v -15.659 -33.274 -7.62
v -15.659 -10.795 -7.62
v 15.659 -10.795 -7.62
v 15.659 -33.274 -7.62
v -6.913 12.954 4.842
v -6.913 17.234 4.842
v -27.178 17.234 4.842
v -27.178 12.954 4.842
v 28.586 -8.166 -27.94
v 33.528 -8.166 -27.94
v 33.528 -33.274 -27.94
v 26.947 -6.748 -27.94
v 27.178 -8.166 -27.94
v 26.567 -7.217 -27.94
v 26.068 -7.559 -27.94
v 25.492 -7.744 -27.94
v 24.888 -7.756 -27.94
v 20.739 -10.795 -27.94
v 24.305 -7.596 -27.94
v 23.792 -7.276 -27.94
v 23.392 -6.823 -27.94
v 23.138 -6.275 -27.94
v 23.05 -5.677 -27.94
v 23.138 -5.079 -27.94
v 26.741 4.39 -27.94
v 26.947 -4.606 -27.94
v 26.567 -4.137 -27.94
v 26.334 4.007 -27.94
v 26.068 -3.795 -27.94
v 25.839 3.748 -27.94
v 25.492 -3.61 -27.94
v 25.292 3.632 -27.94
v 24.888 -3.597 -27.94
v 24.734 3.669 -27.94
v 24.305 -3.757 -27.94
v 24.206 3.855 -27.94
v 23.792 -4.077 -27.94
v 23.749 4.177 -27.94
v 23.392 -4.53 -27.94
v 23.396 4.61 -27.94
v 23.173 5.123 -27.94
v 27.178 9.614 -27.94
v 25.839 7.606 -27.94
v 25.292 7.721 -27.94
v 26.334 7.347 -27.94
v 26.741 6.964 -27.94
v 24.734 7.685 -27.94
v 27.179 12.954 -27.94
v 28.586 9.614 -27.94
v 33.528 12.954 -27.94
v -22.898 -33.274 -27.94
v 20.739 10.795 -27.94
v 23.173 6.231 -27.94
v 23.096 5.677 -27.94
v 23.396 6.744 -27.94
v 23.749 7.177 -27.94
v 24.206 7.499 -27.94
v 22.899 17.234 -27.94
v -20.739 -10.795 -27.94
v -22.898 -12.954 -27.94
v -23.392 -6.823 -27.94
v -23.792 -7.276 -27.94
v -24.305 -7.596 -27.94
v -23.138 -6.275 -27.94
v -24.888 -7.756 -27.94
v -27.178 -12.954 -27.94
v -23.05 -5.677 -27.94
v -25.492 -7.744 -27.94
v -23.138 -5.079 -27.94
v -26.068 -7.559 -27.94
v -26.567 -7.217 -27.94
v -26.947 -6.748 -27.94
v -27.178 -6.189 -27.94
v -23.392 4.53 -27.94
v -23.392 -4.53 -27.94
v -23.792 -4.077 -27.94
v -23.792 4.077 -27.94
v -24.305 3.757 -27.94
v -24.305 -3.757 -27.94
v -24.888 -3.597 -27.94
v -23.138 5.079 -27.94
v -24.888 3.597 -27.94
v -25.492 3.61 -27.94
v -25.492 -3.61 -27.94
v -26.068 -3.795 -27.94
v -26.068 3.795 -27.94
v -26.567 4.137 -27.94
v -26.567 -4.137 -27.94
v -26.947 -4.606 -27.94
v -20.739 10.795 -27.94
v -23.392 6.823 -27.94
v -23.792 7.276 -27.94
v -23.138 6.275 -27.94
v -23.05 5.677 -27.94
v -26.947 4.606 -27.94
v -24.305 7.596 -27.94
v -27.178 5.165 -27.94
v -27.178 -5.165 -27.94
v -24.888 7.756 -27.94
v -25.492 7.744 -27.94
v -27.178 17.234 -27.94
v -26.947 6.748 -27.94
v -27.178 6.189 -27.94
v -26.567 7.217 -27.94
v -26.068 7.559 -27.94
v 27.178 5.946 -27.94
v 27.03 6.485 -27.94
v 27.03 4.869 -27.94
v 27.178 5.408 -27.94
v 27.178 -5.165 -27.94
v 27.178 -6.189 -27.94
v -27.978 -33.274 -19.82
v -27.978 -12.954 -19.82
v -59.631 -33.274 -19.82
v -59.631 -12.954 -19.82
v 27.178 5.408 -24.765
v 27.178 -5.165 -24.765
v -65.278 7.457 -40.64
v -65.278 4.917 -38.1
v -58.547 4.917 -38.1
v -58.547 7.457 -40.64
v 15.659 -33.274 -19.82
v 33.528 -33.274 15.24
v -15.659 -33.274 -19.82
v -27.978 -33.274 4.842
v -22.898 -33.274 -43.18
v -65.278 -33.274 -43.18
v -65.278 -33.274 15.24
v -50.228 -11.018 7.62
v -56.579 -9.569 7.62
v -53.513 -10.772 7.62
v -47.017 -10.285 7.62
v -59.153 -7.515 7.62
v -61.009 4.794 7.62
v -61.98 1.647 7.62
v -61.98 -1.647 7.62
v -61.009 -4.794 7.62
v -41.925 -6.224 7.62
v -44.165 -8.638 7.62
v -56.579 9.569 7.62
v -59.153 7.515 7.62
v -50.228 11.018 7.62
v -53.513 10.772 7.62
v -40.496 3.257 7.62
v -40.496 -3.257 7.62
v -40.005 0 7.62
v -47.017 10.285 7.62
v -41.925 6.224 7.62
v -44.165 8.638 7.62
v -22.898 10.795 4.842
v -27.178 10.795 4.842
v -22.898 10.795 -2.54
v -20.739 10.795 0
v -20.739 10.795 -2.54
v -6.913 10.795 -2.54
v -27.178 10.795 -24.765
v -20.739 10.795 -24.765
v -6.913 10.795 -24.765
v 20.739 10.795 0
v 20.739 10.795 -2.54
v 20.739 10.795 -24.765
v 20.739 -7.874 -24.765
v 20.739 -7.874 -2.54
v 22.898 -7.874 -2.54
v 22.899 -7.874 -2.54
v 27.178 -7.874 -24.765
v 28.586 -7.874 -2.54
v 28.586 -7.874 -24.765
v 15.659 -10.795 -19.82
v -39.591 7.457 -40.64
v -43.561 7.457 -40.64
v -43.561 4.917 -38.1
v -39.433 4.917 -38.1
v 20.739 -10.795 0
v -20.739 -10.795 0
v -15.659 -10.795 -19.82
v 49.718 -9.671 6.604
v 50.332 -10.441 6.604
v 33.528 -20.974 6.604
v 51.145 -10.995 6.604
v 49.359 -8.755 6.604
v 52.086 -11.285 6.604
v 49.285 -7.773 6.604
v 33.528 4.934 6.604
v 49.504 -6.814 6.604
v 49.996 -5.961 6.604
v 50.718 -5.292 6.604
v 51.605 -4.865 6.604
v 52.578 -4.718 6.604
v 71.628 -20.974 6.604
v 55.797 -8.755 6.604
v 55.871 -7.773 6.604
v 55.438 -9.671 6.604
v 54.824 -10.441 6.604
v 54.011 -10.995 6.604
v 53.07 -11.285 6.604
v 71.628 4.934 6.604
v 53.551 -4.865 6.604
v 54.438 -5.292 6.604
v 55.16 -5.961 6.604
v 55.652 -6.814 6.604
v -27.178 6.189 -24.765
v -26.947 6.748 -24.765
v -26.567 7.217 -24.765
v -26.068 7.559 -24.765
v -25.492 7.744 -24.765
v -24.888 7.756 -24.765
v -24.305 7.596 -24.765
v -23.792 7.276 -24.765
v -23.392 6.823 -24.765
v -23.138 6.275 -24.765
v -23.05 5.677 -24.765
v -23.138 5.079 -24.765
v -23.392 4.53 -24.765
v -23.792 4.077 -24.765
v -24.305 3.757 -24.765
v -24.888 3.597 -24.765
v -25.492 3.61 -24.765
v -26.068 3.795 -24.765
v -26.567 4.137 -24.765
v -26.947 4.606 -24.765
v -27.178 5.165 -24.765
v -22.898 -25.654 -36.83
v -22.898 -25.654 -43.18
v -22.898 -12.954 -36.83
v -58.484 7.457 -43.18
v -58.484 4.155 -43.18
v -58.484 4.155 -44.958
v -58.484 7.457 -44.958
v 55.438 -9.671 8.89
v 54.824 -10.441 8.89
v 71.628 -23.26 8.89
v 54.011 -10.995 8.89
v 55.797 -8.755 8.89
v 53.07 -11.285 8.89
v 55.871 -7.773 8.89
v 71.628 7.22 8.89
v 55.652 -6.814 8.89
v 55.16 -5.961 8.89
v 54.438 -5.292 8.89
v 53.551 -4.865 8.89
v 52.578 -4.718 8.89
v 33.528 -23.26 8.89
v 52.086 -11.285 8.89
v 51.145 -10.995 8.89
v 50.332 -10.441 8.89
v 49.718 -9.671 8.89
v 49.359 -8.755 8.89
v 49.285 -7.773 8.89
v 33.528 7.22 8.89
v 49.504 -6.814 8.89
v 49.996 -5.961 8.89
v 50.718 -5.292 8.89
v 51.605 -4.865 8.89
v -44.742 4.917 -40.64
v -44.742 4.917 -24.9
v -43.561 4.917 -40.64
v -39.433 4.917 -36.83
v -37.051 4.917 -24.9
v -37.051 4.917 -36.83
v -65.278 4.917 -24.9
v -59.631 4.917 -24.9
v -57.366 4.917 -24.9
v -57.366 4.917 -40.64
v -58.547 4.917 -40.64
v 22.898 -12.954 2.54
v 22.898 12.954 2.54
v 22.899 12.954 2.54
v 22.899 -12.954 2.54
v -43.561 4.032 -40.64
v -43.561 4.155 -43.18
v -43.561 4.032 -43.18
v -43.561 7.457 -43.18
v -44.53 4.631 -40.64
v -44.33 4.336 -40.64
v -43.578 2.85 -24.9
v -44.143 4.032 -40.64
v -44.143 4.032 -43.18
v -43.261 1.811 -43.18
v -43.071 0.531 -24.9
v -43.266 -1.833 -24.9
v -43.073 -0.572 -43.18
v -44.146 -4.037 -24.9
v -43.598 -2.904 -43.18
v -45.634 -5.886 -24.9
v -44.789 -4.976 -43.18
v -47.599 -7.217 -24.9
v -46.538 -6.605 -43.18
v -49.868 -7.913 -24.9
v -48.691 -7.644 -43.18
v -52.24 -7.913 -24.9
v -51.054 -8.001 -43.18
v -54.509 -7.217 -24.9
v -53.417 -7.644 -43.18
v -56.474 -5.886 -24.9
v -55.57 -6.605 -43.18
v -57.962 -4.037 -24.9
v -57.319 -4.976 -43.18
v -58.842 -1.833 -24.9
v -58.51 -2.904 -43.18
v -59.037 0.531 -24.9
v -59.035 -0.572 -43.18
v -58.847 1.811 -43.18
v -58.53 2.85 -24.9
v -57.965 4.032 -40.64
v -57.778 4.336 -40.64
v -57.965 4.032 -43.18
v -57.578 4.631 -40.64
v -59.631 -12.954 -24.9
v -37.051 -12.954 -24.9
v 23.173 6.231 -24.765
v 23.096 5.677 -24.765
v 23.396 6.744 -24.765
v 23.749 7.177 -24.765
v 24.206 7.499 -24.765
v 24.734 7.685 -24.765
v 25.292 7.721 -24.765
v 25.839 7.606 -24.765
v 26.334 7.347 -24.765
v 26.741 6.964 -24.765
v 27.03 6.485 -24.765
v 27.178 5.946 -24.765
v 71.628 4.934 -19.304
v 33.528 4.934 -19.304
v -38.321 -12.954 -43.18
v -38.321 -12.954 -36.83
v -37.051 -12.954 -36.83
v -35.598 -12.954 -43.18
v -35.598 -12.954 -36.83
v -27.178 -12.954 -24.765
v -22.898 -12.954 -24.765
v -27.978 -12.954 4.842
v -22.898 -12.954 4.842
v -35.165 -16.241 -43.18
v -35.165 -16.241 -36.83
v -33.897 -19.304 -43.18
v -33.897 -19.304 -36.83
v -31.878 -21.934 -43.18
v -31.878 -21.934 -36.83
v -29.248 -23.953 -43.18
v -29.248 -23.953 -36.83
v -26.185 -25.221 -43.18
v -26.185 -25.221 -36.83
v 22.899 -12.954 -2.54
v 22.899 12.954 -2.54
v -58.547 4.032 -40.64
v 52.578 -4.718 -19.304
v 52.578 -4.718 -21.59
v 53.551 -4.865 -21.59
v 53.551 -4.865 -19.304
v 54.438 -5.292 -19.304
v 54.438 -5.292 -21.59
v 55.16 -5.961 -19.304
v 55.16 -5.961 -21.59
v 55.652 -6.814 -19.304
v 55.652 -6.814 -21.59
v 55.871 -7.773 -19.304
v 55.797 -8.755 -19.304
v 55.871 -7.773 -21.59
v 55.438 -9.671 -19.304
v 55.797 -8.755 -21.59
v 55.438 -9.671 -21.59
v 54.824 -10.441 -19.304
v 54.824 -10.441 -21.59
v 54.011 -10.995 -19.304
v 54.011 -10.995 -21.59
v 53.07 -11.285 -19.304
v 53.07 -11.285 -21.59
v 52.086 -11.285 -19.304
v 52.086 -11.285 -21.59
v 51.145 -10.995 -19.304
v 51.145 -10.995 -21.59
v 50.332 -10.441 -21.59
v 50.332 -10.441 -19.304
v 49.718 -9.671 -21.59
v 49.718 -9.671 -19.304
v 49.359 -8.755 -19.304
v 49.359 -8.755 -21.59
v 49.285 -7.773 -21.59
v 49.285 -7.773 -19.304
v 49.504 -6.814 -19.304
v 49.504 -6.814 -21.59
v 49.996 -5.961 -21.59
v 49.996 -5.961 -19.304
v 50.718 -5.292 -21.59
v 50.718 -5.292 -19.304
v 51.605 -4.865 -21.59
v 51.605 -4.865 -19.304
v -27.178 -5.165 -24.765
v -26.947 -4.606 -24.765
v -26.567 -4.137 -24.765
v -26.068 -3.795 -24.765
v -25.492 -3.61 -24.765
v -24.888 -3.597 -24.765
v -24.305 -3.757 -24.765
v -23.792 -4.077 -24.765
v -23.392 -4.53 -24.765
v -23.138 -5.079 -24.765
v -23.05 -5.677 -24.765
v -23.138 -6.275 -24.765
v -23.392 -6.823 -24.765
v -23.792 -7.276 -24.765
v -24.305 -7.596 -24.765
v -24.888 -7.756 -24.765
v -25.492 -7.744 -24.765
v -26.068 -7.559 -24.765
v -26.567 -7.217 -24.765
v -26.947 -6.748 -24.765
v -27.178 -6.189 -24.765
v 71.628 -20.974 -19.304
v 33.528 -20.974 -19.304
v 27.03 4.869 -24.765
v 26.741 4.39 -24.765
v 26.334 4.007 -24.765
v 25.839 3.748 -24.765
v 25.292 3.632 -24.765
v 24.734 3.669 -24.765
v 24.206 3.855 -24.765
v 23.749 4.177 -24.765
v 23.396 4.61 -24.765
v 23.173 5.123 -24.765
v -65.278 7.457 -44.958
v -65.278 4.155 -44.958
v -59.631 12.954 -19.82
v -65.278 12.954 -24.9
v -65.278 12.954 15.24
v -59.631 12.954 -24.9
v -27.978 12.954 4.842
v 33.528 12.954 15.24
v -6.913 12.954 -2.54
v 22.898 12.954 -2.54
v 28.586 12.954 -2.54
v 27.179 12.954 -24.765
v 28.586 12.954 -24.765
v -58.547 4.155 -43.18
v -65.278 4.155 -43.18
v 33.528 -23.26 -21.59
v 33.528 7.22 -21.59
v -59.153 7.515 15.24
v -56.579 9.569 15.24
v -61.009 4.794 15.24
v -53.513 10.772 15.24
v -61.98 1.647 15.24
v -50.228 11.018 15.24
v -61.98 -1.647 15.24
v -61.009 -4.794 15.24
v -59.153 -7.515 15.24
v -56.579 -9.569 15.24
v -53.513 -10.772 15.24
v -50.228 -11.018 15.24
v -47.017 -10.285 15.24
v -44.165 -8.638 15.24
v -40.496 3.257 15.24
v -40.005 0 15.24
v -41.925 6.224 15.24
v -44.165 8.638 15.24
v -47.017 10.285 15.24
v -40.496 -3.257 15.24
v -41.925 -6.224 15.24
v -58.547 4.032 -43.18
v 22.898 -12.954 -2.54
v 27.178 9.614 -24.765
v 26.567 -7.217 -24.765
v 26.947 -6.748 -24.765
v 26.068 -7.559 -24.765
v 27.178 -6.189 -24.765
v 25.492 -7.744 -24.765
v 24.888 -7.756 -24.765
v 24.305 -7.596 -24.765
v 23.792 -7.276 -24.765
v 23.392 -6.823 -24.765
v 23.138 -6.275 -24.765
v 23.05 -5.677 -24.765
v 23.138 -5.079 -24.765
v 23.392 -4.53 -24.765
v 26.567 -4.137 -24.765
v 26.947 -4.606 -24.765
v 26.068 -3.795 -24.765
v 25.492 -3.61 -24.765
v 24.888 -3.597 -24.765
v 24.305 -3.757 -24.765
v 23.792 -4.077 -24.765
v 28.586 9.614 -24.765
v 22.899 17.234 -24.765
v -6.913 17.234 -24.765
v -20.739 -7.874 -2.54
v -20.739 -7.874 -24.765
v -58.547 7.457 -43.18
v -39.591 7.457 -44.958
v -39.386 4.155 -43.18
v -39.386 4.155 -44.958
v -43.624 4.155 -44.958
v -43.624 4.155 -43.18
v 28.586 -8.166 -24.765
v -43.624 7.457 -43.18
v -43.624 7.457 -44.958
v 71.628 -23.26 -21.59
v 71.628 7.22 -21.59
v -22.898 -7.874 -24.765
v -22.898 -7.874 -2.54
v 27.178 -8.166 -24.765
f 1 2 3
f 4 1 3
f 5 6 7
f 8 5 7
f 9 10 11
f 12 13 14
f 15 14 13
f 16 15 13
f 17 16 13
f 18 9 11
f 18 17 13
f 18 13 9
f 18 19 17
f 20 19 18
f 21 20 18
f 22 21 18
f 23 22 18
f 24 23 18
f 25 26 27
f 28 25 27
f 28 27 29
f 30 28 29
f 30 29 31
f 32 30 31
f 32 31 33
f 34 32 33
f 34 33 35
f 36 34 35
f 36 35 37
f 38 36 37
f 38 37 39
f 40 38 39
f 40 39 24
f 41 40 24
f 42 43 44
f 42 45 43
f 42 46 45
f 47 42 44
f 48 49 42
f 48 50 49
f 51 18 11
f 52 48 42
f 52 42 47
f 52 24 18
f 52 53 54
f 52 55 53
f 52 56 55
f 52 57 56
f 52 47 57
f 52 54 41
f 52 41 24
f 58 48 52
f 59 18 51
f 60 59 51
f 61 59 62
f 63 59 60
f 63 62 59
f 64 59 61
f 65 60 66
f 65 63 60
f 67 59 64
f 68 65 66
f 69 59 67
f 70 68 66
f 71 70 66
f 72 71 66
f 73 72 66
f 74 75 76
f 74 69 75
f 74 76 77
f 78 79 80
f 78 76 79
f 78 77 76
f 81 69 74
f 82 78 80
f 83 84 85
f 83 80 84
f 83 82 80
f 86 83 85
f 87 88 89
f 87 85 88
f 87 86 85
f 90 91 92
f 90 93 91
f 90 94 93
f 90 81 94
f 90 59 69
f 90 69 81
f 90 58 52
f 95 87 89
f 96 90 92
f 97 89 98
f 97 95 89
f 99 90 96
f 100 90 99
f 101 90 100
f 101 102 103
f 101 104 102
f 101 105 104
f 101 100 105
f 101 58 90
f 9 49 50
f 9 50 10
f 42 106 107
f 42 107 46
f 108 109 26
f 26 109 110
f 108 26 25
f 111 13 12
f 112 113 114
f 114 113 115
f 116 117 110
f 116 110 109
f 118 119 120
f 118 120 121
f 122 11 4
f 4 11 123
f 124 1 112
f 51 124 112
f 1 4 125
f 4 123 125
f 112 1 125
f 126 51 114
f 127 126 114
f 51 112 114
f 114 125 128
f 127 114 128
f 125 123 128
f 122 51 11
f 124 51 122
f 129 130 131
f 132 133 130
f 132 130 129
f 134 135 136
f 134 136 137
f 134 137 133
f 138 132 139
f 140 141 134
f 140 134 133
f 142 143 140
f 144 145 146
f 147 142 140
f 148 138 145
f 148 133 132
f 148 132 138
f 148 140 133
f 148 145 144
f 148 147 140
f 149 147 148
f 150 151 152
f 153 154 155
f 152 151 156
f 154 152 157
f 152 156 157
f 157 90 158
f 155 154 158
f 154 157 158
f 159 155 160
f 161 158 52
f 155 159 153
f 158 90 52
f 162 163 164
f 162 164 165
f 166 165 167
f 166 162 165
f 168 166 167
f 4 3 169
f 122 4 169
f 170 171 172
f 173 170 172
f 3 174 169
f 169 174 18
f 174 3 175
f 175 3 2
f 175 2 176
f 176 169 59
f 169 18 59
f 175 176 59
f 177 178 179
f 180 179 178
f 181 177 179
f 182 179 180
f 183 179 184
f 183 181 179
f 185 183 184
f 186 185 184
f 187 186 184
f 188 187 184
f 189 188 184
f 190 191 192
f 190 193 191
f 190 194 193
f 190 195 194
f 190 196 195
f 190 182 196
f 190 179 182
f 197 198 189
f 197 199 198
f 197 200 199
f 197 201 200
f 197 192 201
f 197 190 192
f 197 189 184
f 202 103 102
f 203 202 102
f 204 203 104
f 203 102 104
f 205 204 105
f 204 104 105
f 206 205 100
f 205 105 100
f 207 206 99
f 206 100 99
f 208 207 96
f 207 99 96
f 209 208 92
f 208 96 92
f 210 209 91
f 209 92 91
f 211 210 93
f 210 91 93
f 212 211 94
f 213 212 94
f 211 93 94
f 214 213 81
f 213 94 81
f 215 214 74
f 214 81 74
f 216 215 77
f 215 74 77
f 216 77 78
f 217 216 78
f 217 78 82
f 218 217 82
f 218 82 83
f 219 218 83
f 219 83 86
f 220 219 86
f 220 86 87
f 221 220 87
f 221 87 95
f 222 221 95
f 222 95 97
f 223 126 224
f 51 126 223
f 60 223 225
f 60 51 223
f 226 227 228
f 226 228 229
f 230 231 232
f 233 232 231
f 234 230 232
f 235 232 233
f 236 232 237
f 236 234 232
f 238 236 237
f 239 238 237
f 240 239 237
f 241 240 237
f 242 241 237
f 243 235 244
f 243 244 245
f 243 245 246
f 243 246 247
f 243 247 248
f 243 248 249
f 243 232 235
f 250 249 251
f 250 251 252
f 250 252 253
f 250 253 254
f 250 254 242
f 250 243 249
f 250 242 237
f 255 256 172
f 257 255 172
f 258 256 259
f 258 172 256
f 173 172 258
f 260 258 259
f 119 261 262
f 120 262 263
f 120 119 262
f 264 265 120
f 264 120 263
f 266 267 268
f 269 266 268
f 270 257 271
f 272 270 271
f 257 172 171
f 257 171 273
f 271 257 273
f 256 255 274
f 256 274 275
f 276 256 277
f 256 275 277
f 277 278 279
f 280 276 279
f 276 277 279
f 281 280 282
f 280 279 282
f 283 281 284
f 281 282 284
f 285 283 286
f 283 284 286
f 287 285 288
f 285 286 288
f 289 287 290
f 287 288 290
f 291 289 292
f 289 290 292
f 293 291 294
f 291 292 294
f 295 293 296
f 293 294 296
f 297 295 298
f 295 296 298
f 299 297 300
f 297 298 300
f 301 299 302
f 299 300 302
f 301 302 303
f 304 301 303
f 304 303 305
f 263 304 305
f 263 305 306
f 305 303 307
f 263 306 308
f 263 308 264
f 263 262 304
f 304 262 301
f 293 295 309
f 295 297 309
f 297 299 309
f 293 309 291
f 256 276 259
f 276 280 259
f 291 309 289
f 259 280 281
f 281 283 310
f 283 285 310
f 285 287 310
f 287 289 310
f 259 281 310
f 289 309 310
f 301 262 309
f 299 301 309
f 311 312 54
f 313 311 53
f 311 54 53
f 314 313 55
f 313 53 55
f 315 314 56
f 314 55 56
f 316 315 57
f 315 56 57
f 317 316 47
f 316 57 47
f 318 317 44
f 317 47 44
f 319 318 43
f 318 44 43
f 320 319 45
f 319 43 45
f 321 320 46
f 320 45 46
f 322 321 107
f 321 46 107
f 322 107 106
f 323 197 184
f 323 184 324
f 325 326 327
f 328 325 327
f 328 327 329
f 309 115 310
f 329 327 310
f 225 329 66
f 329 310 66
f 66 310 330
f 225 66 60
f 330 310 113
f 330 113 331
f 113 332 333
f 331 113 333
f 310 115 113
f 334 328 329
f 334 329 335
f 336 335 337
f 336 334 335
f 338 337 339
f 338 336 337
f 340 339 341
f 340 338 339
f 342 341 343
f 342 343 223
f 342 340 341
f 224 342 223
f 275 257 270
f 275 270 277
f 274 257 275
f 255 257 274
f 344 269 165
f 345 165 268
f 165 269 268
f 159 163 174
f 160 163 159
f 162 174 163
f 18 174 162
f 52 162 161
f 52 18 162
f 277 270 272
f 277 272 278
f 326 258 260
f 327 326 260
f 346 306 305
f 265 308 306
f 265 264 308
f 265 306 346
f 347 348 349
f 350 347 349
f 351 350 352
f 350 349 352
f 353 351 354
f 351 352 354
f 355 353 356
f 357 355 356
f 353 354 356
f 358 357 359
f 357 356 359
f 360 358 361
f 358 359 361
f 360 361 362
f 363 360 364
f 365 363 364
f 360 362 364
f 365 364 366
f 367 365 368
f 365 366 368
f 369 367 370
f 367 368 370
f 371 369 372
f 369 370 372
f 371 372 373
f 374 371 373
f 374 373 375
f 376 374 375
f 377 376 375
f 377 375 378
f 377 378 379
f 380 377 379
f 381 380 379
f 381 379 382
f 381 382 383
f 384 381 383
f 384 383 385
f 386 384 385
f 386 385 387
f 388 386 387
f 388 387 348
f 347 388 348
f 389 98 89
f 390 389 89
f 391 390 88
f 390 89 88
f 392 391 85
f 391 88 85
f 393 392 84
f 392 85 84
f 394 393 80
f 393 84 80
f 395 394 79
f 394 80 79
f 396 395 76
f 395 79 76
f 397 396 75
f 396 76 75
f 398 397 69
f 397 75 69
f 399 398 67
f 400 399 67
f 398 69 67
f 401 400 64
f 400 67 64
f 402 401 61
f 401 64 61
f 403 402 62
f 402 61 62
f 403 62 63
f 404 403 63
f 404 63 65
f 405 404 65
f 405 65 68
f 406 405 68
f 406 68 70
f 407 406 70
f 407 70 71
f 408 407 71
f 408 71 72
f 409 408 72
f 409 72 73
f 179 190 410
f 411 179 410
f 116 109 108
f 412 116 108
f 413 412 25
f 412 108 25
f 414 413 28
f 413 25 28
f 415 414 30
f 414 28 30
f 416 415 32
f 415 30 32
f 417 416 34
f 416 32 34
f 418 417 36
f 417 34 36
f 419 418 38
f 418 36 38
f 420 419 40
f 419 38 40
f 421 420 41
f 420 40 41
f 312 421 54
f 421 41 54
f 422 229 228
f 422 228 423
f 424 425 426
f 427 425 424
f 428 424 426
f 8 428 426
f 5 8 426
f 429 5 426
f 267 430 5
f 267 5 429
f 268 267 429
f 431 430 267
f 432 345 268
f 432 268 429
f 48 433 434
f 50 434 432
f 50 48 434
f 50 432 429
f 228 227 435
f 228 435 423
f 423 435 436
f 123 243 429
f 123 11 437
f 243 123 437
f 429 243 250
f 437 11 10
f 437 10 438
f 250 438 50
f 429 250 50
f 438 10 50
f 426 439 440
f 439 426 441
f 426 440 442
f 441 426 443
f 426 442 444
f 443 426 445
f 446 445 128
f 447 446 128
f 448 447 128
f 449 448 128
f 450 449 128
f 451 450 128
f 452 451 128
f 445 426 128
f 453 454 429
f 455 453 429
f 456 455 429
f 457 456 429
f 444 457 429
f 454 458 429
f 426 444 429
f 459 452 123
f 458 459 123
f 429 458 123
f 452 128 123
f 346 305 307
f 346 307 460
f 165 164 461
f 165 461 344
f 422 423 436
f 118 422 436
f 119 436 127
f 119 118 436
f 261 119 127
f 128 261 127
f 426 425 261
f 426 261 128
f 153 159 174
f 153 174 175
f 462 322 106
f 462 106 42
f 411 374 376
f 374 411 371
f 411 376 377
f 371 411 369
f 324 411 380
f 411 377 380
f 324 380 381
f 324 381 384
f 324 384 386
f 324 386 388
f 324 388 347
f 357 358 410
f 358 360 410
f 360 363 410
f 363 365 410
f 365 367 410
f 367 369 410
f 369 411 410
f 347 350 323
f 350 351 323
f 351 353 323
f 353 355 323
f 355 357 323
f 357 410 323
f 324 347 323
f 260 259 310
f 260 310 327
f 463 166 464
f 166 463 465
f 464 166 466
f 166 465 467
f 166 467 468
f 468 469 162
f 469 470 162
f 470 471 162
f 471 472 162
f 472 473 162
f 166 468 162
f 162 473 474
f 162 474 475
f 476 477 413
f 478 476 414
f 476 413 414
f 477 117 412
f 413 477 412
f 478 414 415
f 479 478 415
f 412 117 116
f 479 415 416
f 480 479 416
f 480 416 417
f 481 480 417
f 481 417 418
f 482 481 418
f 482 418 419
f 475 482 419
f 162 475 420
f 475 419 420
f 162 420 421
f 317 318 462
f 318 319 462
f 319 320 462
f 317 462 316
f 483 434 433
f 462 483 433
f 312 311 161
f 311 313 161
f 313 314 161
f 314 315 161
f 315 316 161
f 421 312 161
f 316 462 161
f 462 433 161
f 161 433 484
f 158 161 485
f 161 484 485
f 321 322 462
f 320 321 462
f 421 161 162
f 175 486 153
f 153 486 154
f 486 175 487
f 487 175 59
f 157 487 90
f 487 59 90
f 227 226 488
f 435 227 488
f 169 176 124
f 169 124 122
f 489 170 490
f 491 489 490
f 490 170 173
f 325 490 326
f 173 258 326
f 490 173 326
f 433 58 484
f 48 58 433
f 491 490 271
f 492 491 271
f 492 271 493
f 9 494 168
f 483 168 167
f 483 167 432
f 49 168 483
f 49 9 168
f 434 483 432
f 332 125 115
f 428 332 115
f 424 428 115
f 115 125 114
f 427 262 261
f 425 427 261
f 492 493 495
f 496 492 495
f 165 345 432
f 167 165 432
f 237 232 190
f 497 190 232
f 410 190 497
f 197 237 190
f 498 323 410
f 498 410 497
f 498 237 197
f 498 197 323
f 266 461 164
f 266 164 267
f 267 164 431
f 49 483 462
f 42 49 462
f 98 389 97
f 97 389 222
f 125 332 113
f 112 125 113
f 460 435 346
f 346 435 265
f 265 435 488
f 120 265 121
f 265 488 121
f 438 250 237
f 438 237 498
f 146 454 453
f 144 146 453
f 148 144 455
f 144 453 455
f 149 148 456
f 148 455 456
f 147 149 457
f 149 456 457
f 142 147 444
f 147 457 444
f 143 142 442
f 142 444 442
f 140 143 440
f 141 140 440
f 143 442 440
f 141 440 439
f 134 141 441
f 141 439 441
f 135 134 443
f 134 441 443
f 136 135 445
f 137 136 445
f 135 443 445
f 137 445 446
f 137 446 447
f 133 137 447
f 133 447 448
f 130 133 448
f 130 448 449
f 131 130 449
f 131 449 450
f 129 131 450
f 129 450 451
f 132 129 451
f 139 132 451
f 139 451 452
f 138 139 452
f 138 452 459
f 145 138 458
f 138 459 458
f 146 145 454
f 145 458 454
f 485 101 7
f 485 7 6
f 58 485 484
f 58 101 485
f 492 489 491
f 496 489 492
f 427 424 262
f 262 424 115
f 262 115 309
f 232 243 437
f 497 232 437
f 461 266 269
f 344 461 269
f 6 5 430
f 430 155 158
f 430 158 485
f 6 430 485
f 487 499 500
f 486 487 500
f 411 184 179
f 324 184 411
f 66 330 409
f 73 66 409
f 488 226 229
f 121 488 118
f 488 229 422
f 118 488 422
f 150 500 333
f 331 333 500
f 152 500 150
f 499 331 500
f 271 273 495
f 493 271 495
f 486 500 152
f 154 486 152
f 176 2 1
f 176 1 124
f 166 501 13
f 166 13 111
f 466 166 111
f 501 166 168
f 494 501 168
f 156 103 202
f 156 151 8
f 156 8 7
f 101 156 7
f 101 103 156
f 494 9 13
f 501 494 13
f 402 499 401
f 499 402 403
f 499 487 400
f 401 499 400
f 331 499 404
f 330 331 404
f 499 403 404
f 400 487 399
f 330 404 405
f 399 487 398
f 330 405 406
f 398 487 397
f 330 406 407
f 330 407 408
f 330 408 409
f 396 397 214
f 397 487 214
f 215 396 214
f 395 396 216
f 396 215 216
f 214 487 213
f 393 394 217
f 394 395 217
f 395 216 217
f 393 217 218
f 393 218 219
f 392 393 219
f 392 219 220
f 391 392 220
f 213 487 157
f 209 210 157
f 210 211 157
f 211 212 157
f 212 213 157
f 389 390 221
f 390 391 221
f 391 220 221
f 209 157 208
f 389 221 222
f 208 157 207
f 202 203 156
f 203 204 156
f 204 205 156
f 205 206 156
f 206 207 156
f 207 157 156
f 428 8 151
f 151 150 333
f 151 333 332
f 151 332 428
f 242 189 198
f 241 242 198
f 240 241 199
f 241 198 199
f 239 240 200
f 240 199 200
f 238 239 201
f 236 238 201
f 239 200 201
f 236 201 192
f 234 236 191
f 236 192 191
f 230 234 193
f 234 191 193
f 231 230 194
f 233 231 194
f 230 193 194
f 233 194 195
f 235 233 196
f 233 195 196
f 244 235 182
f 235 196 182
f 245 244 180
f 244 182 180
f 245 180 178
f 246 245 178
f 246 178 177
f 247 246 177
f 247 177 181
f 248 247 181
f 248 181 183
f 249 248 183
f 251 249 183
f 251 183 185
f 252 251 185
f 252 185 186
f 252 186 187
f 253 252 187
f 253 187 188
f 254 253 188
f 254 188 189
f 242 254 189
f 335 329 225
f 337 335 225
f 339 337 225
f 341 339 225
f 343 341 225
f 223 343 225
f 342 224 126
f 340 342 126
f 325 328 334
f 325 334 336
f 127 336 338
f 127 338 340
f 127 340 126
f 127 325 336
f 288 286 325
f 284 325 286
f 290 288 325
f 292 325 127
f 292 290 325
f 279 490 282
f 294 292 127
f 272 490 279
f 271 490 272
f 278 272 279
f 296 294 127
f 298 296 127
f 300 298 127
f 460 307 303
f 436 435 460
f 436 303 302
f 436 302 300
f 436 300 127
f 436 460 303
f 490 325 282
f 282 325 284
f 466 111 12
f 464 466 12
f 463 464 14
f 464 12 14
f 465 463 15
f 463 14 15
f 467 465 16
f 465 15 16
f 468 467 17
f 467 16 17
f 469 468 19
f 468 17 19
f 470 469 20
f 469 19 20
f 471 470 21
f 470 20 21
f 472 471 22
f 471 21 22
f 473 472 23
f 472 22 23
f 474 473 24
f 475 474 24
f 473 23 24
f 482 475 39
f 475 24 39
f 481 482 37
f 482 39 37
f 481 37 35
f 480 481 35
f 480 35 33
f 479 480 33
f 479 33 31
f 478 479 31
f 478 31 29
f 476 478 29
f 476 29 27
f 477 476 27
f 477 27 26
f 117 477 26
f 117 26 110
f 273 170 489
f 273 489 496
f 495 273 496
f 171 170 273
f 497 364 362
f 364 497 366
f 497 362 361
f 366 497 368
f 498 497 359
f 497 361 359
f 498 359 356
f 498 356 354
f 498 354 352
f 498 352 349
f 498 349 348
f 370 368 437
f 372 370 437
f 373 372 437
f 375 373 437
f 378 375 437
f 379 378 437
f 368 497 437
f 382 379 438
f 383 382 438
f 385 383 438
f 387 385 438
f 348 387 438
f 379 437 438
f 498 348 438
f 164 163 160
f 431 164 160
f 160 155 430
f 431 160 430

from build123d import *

# Parameters (mm, degrees)
SKETCH1_W                = 54.356
SKETCH1_H                = 34.4678
SKETCH1_W_2              = 40.2082
SKETCH1_H_2              = 20.32
BOSS_EXTRUDE1_DEPTH      = 27.94
SKETCH2_W                = 54.356
SKETCH2_H                = 34.4678
SKETCH2_W_2              = 45.7962
SKETCH2_H_2              = 25.908
CUT_EXTRUDE1_DEPTH       = 24.765
SKETCH3_R                = 2.04968225
SKETCH3_R_2              = 2.0955
CUT_EXTRUDE2_DEPTH       = 43.618007851
SKETCH4_W                = 19.05
SKETCH4_H                = 9.525
CUT_EXTRUDE3_DEPTH       = 12.7
SKETCH5_W                = 45.7962
SKETCH5_H                = 25.908
BOSS_EXTRUDE2_DEPTH      = 2.54
SKETCH6_W                = 25.4
SKETCH6_H                = 4.2799
BOSS_EXTRUDE3_DEPTH      = 27.305
SKETCH7_W                = 25.4
SKETCH7_H                = 6.35
BOSS_EXTRUDE4_DEPTH      = 19.05
SKETCH10_W               = 3.175
SKETCH10_H               = 19.05
BOSS_EXTRUDE5_DEPTH      = 19.05
CHAMFER1_SIZE            = 19.05
SKETCH12_W               = 7.62
SKETCH12_H               = 31.75
BOSS_EXTRUDE6_DEPTH      = 3.175
SKETCH13_W               = 41.4782
SKETCH13_H               = 21.59
CUT_EXTRUDE7_DEPTH       = 27.94
SKETCH14_W               = 22.225
SKETCH14_H               = 20.828
SKETCH14_W_2             = 49.53
SKETCH14_H_2             = 7.4549
CUT_EXTRUDE8_DEPTH       = 61.866925258
SKETCH15_W               = 3.175
SKETCH15_H               = 4.2799
CUT_EXTRUDE9_DEPTH       = 64.49980823
SKETCH16_W               = 45.796723327
SKETCH16_H               = 30.48
BOSS_EXTRUDE7_DEPTH      = 20.32
BOSS_EXTRUDE8_DEPTH      = 15.24
BOSS_EXTRUDE8_DEPTH_BACK = 10.16
SKETCH17_W               = 42.3799
SKETCH17_H               = 20.32
SKETCH18_W               = 28.227007584
SKETCH18_H               = 18.279535796
BOSS_EXTRUDE9_DEPTH      = 17.871186
SKETCH19_R               = 8.001
CUT_EXTRUDE10_DEPTH      = 18.279536
SKETCH20_W               = 19.05
SKETCH20_H               = 21.1201
CUT_EXTRUDE11_DEPTH      = 75.022207933
SKETCH21_W               = 45.796723327
SKETCH21_H               = 46.228
BOSS_EXTRUDE10_DEPTH     = 12.7
SKETCH25_W               = 6.35
SKETCH25_H               = 7.62
SKETCH25_W_2             = 10.629376673
SKETCH25_H_2             = 25.1079
BOSS_EXTRUDE12_DEPTH     = 3.175
SKETCH26_W               = 10.629376673
SKETCH26_H               = 50.5079
BOSS_EXTRUDE14_DEPTH     = 17.78
BOSS_EXTRUDE15_START     = -3.175
SKETCH27_W               = 4.942428742
SKETCH27_H               = 50.5079
BOSS_EXTRUDE15_DEPTH     = 25.4
SKETCH28_W               = 7.846471258
SKETCH28_H               = 22.225
BOSS_EXTRUDE16_DEPTH     = 25.4
SKETCH29_W               = 30.48
SKETCH29_H               = 30.48
BOSS_EXTRUDE17_DEPTH     = 38.1
SKETCH30_W               = 25.908
SKETCH30_H               = 25.908
CUT_EXTRUDE13_DEPTH      = 38.1
SKETCH31_R               = 3.302
CUT_EXTRUDE14_DEPTH      = 88.144583079
BOSS_EXTRUDE18_DEPTH     = 20.32
SKETCH34_W               = 31.3182
SKETCH34_H               = 12.200464204
CUT_EXTRUDE15_DEPTH      = 89.208287701
BOSS_EXTRUDE22_REACH     = 99.704
SKETCH37_R               = 11.049
CUT_EXTRUDE16_DEPTH      = 7.62
BOSS_EXTRUDE25_REACH     = 90.533
SKETCH38_W               = 20.264989175
SKETCH38_H               = 6.4389
SKETCH39_W               = 10.629376673
SKETCH39_H               = 43.18
CUT_EXTRUDE17_DEPTH      = 4.2799
BOSS_EXTRUDE26_DEPTH     = 3.175
SKETCH42_W               = 28.227007584
SKETCH42_H               = 2.54
BOSS_EXTRUDE27_DEPTH     = 2.54
CUT_EXTRUDE18_DEPTH      = 7.62
CUT_EXTRUDE18_DEPTH_BACK = 2.54
SKETCH41_W               = 14.986
SKETCH41_H               = 7.62
SKETCH43_W               = 6.573507584
SKETCH43_H               = 3.302
SKETCH43_W_2             = 6.7945
BOSS_EXTRUDE28_DEPTH     = 1.778
BOSS_EXTRUDE29_DEPTH     = 6.731
BOSS_EXTRUDE30_DEPTH     = 6.510007584
CUT_EXTRUDE19_DEPTH      = 6.35
CUT_EXTRUDE20_DEPTH      = 6.35
CUT_EXTRUDE20_DEPTH_BACK = 6.35


with BuildPart() as part:
    # Sketch1 → Boss-Extrude1 (new body)
    with BuildSketch(Plane.XY):
        Rectangle(SKETCH1_W, SKETCH1_H)
        Rectangle(SKETCH1_W_2, SKETCH1_H_2, mode=Mode.SUBTRACT)
    extrude(amount=-BOSS_EXTRUDE1_DEPTH)

    # Sketch2 → Cut-Extrude1 (cut)
    with BuildSketch(Plane.XY):
        Rectangle(SKETCH2_W, SKETCH2_H)
        Rectangle(SKETCH2_W_2, SKETCH2_H_2, mode=Mode.SUBTRACT)
    extrude(amount=-CUT_EXTRUDE1_DEPTH, mode=Mode.SUBTRACT)

    # Sketch3 → Cut-Extrude2 (cut, through all)
    with BuildSketch(Plane(origin=(0, 0, -27.94), x_dir=(-1, 0, 0), z_dir=(0, 0, -1))):
        with Locations((-25.146, 5.6769)):
            Circle(SKETCH3_R)
        with Locations((-25.146, -5.6769)):
            Circle(SKETCH3_R_2)
        with Locations((25.146, -5.6769)):
            Circle(SKETCH3_R_2)
        with Locations((25.146, 5.6769)):
            Circle(SKETCH3_R_2)
    extrude(amount=-CUT_EXTRUDE2_DEPTH, mode=Mode.SUBTRACT)

    # Sketch4 → Cut-Extrude3 (cut)
    with BuildSketch(Plane(origin=(22.8981, 0, 0), x_dir=(0, 0, -1), z_dir=(1, 0, 0))):
        with Locations((12.065, 0)):
            Rectangle(SKETCH4_W, SKETCH4_H)
    extrude(amount=-CUT_EXTRUDE3_DEPTH, mode=Mode.SUBTRACT)

    # Sketch5 → Boss-Extrude2 (add)
    with BuildSketch(Plane.XY):
        Rectangle(SKETCH5_W, SKETCH5_H)
    extrude(amount=BOSS_EXTRUDE2_DEPTH)

    # Sketch6 → Boss-Extrude3 (add)
    with BuildSketch(Plane.XY.offset(2.54)):
        with Locations((0, -15.09395)):
            Rectangle(SKETCH6_W, SKETCH6_H)
    extrude(amount=-BOSS_EXTRUDE3_DEPTH)

    # Sketch7 → Boss-Extrude4 (add)
    with BuildSketch(Plane.XY.offset(2.54)):
        with Locations((0, -14.0589)):
            Rectangle(SKETCH7_W, SKETCH7_H)
    extrude(amount=BOSS_EXTRUDE4_DEPTH)

    # Sketch10 → Boss-Extrude5 (add)
    with BuildSketch(Plane(origin=(0, -10.8839, 0), x_dir=(1, 0, 0), z_dir=(0, 1, 0))):
        with Locations((11.1125, -12.065)):
            Rectangle(SKETCH10_W, SKETCH10_H)
        with Locations((-11.1125, -12.065)):
            Rectangle(SKETCH10_W, SKETCH10_H)
    extrude(amount=BOSS_EXTRUDE5_DEPTH)

    # Chamfer1
    chamfer1_edges = [part.edges().sort_by_distance(p)[0] for p in [
        (-11.1125, 8.1661, 21.59),
        (11.1125, 8.1661, 21.59),
    ]]
    chamfer(chamfer1_edges, length=CHAMFER1_SIZE - 0.0001)  # a hair under: the kernel refuses the full size

    # Sketch12 → Boss-Extrude6 (add)
    with BuildSketch(Plane.XZ.offset(17.2339)):
        with Locations((0, -12.065)):
            Rectangle(SKETCH12_W, SKETCH12_H)
    extrude(amount=BOSS_EXTRUDE6_DEPTH)

    # Sketch13 → Cut-Extrude7 (cut)
    with BuildSketch(Plane(origin=(0, 0, -27.94), x_dir=(-1, 0, 0), z_dir=(0, 0, -1))):
        Rectangle(SKETCH13_W, SKETCH13_H)
    extrude(amount=-CUT_EXTRUDE7_DEPTH, mode=Mode.SUBTRACT)

    # Sketch14 → Cut-Extrude8 (cut, through all)
    with BuildSketch(Plane.ZY.offset(22.8981)):
        with Locations((-13.6525, 2.54)):
            Rectangle(SKETCH14_W, SKETCH14_H)
        with Locations((-3.175, -16.68145)):
            Rectangle(SKETCH14_W_2, SKETCH14_H_2)
    extrude(amount=-CUT_EXTRUDE8_DEPTH, mode=Mode.SUBTRACT)

    # Sketch15 → Cut-Extrude9 (cut, through all)
    with BuildSketch(Plane.ZY.offset(27.178)):
        with Locations((-26.3525, -15.09395)):
            Rectangle(SKETCH15_W, SKETCH15_H)
    extrude(amount=-CUT_EXTRUDE9_DEPTH, mode=Mode.SUBTRACT)

    # Sketch16 → Boss-Extrude7 (add)
    with BuildSketch(Plane.XZ.offset(12.954)):
        with Locations((0.000261663, -12.7)):
            Rectangle(SKETCH16_W, SKETCH16_H)
    extrude(amount=BOSS_EXTRUDE7_DEPTH)

    # Sketch20 → Cut-Extrude11 (cut, through all)
    with BuildSketch(Plane.ZY.offset(22.8981)):
        with Locations((12.065, -2.39395)):
            Rectangle(SKETCH20_W, SKETCH20_H)
    extrude(amount=-CUT_EXTRUDE11_DEPTH, mode=Mode.SUBTRACT)

    # Sketch21 → Boss-Extrude10 (add)
    with BuildSketch(Plane.XY.offset(2.54)):
        with Locations((0.000261663, -10.16)):
            Rectangle(SKETCH21_W, SKETCH21_H)
    extrude(amount=BOSS_EXTRUDE10_DEPTH)

    # Sketch25 → Boss-Extrude12 (add)
    with BuildSketch(Plane(origin=(0, 0, -27.94), x_dir=(-1, 0, 0), z_dir=(0, 0, -1))):
        with Locations((-30.353, 13.4239)):
            Rectangle(SKETCH25_W, SKETCH25_H)
        with Locations((-28.213311664, -20.72005)):
            Rectangle(SKETCH25_W_2, SKETCH25_H_2)
    extrude(amount=-BOSS_EXTRUDE12_DEPTH)

    # Sketch26 → Boss-Extrude14 (add)
    with BuildSketch(Plane.XY.offset(15.24)):
        with Locations((28.213311664, -8.02005)):
            Rectangle(SKETCH26_W, SKETCH26_H)
    extrude(amount=-BOSS_EXTRUDE14_DEPTH)

    # Sketch27 → Boss-Extrude15 (add)
    with BuildSketch(Plane.XY.offset(-24.765).offset(BOSS_EXTRUDE15_START)):
        with Locations((31.056785629, -8.02005)):
            Rectangle(SKETCH27_W, SKETCH27_H)
    extrude(amount=BOSS_EXTRUDE15_DEPTH)

    # Sketch28 → Boss-Extrude16 (add)
    with BuildSketch(Plane(origin=(0, -7.874, 0), x_dir=(1, 0, 0), z_dir=(0, 1, 0))):
        with Locations((24.662335629, 13.6525)):
            Rectangle(SKETCH28_W, SKETCH28_H)
    extrude(amount=-BOSS_EXTRUDE16_DEPTH)

    # Sketch29 → Boss-Extrude17 (add)
    with BuildSketch(Plane(origin=(33.528, 0, 0), x_dir=(0, 0, -1), z_dir=(1, 0, 0))):
        with Locations((6.35, -8.02005)):
            Rectangle(SKETCH29_W, SKETCH29_H)
    extrude(amount=BOSS_EXTRUDE17_DEPTH)

    # Sketch30 → Cut-Extrude13 (cut)
    with BuildSketch(Plane(origin=(71.628, 0, 0), x_dir=(0, 0, -1), z_dir=(1, 0, 0))):
        with Locations((6.35, -8.02005)):
            Rectangle(SKETCH30_W, SKETCH30_H)
    extrude(amount=-CUT_EXTRUDE13_DEPTH, mode=Mode.SUBTRACT)

    # Sketch31 → Cut-Extrude14 (cut, through all)
    with BuildSketch(Plane(origin=(0, 0, -21.59), x_dir=(-1, 0, 0), z_dir=(0, 0, -1))):
        with Locations(Location((-52.578, -8.02005, 0), (0, 0, 90))):
            Circle(SKETCH31_R)
    extrude(amount=-CUT_EXTRUDE14_DEPTH, mode=Mode.SUBTRACT)



with BuildPart() as body_2:
    # Sketch17 → Boss-Extrude8 (new, two sides: drawn at the far end of the back side and taken through both)
    with BuildSketch(Plane(origin=(0, 0, -27.94), x_dir=(-1, 0, 0), z_dir=(0, 0, -1)).offset(-BOSS_EXTRUDE8_DEPTH_BACK)):
        with Locations((44.08805, -23.114)):
            Rectangle(SKETCH17_W, SKETCH17_H)
    extrude(amount=BOSS_EXTRUDE8_DEPTH + BOSS_EXTRUDE8_DEPTH_BACK)

    # Sketch18 → Boss-Extrude9 (add)
    with BuildSketch(Plane(origin=(0, -12.954, 0), x_dir=(1, 0, 0), z_dir=(0, 1, 0))):
        with Locations((-51.164496208, 34.040232102)):
            Rectangle(SKETCH18_W, SKETCH18_H)
    extrude(amount=BOSS_EXTRUDE9_DEPTH)

    # Sketch19 → Cut-Extrude10 (cut)
    with BuildSketch(Plane(origin=(0, 0, -43.18), x_dir=(-1, 0, 0), z_dir=(0, 0, -1))):
        with Locations((51.054, 0)):
            Circle(SKETCH19_R)
    extrude(amount=-CUT_EXTRUDE10_DEPTH, mode=Mode.SUBTRACT)


with BuildPart() as part_1:
    add(part.part)

    add(body_2.part)  # Boss-Extrude18 merges body 2
    # Sketch33 → Boss-Extrude18 (add)
    with BuildSketch(Plane.XZ.offset(33.274)):
        Polygon((-65.278, -17.78), (-22.8981, 15.24), (-22.8981, -17.78), align=None)
    extrude(amount=-BOSS_EXTRUDE18_DEPTH)

    # Sketch34 → Cut-Extrude15 (cut, through all)
    with BuildSketch(Plane(origin=(0, -10.795, 0), x_dir=(1, 0, 0), z_dir=(0, 1, 0))):
        Polygon((-27.9781, 19.820464204), (-59.63147171, 19.820464204), (-27.9781, -4.842036979), align=None)
        with Locations((0, 13.720232102)):
            Rectangle(SKETCH34_W, SKETCH34_H)
    extrude(amount=-CUT_EXTRUDE15_DEPTH, mode=Mode.SUBTRACT)

    # Boss-Extrude22: up to this face of the body (flat: up to its plane)
    boss_extrude22_end = Plane(part_1.part.faces().sort_by_distance((0.000186903, 12.954, 6.350020732))[0])
    # Sketch36 → Boss-Extrude22 (add, up to the picked face)
    with BuildSketch(Plane.XZ.offset(33.274), mode=Mode.PRIVATE) as boss_extrude22_sk1:
        Polygon((-65.278, -17.78), (-65.278, 15.24), (-22.8981, 15.24), (-22.8981, 8.800083128), (-22.8981, 4.842036979), (-27.9781, 4.842036979), (-59.63147171, -19.820464204), (-59.63147171, -24.900464204), (-65.278, -24.900464204), (-65.278, -19.820464204), align=None)
    boss_extrude22_tool1 = split(extrude(boss_extrude22_sk1.sketch, amount=-BOSS_EXTRUDE22_REACH, mode=Mode.PRIVATE), bisect_by=boss_extrude22_end, keep=Keep.BOTH, mode=Mode.PRIVATE)
    add(boss_extrude22_tool1.solids().sort_by(Axis((-49.126588, -33.274, 1.423085), (0, 1, 0)))[0])

    # Sketch37 → Cut-Extrude16 (cut)
    with BuildSketch(Plane.XY.offset(15.24)):
        with Locations((-51.054, 0)):
            Circle(SKETCH37_R)
    extrude(amount=-CUT_EXTRUDE16_DEPTH, mode=Mode.SUBTRACT)

    # Boss-Extrude25: up to this face of the body (flat: up to its plane)
    boss_extrude25_end = Plane(part_1.part.faces().sort_by_distance((-25.4381, 0, 4.842036979))[0])
    # Sketch38 → Boss-Extrude25 (add, up to the picked face)
    with BuildSketch(Plane.XY.offset(-24.765), mode=Mode.PRIVATE) as boss_extrude25_sk1:
        with Locations((-17.045505412, 14.01445)):
            Rectangle(SKETCH38_W, SKETCH38_H)
    boss_extrude25_tool1 = split(extrude(boss_extrude25_sk1.sketch, amount=BOSS_EXTRUDE25_REACH, mode=Mode.PRIVATE), bisect_by=boss_extrude25_end, keep=Keep.BOTH, mode=Mode.PRIVATE)
    add(boss_extrude25_tool1.solids().sort_by(Axis((-17.045505, 14.01445, -24.765), (0, 0, 1)))[0])

    # Sketch39 → Cut-Extrude17 (cut)
    with BuildSketch(Plane(origin=(0, 17.2339, 0), x_dir=(1, 0, 0), z_dir=(0, 1, 0))):
        with Locations((28.213311664, 6.35)):
            Rectangle(SKETCH39_W, SKETCH39_H)
    extrude(amount=-CUT_EXTRUDE17_DEPTH, mode=Mode.SUBTRACT)

    # Sketch40 → Boss-Extrude26 (add)
    with BuildSketch(Plane(origin=(0, 0, -27.94), x_dir=(-1, 0, 0), z_dir=(0, 0, -1))):
        Polygon((-22.898623327, 12.954), (-22.898623327, 17.2339), (-27.178523327, 12.954), align=None)
    extrude(amount=-BOSS_EXTRUDE26_DEPTH)

    # Sketch42 → Boss-Extrude27 (add)
    with BuildSketch(Plane(origin=(0, 0, -43.18), x_dir=(-1, 0, 0), z_dir=(0, 0, -1))):
        with Locations((51.164496208, 6.187186)):
            Rectangle(SKETCH42_W, SKETCH42_H)
    extrude(amount=-BOSS_EXTRUDE27_DEPTH)

    # Sketch41 → Cut-Extrude18 (cut, two sides: drawn at the far end of the back side and taken through both)
    with BuildSketch(Plane(origin=(0, 0, -43.18), x_dir=(-1, 0, 0), z_dir=(0, 0, -1)).offset(-CUT_EXTRUDE18_DEPTH_BACK)):
        with Locations((51.054, 7.842124998)):
            Rectangle(SKETCH41_W, SKETCH41_H)
    extrude(amount=CUT_EXTRUDE18_DEPTH + CUT_EXTRUDE18_DEPTH_BACK, mode=Mode.SUBTRACT)

    # Sketch43 → Boss-Extrude28 (add)
    with BuildSketch(Plane(origin=(0, 0, -43.18), x_dir=(-1, 0, 0), z_dir=(0, 0, -1))):
        with Locations((40.337746208, 5.806186)):
            Rectangle(SKETCH43_W, SKETCH43_H)
        with Locations((61.88075, 5.806186)):
            Rectangle(SKETCH43_W_2, SKETCH43_H)
    extrude(amount=BOSS_EXTRUDE28_DEPTH)

    # Sketch44 → Boss-Extrude29 (add)
    with BuildSketch(Plane.ZY.offset(65.278)):
        Polygon((-40.64, 7.457186), (-40.64, 4.917186), (-38.1, 4.917186), align=None)
    extrude(amount=-BOSS_EXTRUDE29_DEPTH)

    # Sketch45 → Boss-Extrude30 (add)
    with BuildSketch(Plane(origin=(-37.050992416, 0, 0), x_dir=(0, 0, -1), z_dir=(1, 0, 0))):
        Polygon((40.64, 4.917186), (40.64, 7.457186), (38.1, 4.917186), align=None)
    extrude(amount=-BOSS_EXTRUDE30_DEPTH)

    # Sketch46 → Cut-Extrude19 (cut)
    with BuildSketch(Plane(origin=(0, 0, -43.18), x_dir=(-1, 0, 0), z_dir=(0, 0, -1))):
        with BuildLine():
            Line((22.8981, -12.954), (35.5981, -12.954))
            ThreePointArc((35.5981, -12.954), (31.878356121, -21.934256121), (22.8981, -25.654))
            Line((22.8981, -25.654), (22.8981, -12.954))
        make_face()
    extrude(amount=-CUT_EXTRUDE19_DEPTH, mode=Mode.SUBTRACT)

    # Sketch47 → Cut-Extrude20 (cut, two sides: drawn at the far end of the back side and taken through both)
    with BuildSketch(Plane(origin=(0, 0, -43.18), x_dir=(-1, 0, 0), z_dir=(0, 0, -1)).offset(-CUT_EXTRUDE20_DEPTH_BACK)):
        Polygon((37.050992416, 7.457186), (39.590992416, 7.457186), (38.320992416, -12.954), (37.050992416, -12.954), align=None)
    extrude(amount=CUT_EXTRUDE20_DEPTH + CUT_EXTRUDE20_DEPTH_BACK, mode=Mode.SUBTRACT)


solid = part_1.part
